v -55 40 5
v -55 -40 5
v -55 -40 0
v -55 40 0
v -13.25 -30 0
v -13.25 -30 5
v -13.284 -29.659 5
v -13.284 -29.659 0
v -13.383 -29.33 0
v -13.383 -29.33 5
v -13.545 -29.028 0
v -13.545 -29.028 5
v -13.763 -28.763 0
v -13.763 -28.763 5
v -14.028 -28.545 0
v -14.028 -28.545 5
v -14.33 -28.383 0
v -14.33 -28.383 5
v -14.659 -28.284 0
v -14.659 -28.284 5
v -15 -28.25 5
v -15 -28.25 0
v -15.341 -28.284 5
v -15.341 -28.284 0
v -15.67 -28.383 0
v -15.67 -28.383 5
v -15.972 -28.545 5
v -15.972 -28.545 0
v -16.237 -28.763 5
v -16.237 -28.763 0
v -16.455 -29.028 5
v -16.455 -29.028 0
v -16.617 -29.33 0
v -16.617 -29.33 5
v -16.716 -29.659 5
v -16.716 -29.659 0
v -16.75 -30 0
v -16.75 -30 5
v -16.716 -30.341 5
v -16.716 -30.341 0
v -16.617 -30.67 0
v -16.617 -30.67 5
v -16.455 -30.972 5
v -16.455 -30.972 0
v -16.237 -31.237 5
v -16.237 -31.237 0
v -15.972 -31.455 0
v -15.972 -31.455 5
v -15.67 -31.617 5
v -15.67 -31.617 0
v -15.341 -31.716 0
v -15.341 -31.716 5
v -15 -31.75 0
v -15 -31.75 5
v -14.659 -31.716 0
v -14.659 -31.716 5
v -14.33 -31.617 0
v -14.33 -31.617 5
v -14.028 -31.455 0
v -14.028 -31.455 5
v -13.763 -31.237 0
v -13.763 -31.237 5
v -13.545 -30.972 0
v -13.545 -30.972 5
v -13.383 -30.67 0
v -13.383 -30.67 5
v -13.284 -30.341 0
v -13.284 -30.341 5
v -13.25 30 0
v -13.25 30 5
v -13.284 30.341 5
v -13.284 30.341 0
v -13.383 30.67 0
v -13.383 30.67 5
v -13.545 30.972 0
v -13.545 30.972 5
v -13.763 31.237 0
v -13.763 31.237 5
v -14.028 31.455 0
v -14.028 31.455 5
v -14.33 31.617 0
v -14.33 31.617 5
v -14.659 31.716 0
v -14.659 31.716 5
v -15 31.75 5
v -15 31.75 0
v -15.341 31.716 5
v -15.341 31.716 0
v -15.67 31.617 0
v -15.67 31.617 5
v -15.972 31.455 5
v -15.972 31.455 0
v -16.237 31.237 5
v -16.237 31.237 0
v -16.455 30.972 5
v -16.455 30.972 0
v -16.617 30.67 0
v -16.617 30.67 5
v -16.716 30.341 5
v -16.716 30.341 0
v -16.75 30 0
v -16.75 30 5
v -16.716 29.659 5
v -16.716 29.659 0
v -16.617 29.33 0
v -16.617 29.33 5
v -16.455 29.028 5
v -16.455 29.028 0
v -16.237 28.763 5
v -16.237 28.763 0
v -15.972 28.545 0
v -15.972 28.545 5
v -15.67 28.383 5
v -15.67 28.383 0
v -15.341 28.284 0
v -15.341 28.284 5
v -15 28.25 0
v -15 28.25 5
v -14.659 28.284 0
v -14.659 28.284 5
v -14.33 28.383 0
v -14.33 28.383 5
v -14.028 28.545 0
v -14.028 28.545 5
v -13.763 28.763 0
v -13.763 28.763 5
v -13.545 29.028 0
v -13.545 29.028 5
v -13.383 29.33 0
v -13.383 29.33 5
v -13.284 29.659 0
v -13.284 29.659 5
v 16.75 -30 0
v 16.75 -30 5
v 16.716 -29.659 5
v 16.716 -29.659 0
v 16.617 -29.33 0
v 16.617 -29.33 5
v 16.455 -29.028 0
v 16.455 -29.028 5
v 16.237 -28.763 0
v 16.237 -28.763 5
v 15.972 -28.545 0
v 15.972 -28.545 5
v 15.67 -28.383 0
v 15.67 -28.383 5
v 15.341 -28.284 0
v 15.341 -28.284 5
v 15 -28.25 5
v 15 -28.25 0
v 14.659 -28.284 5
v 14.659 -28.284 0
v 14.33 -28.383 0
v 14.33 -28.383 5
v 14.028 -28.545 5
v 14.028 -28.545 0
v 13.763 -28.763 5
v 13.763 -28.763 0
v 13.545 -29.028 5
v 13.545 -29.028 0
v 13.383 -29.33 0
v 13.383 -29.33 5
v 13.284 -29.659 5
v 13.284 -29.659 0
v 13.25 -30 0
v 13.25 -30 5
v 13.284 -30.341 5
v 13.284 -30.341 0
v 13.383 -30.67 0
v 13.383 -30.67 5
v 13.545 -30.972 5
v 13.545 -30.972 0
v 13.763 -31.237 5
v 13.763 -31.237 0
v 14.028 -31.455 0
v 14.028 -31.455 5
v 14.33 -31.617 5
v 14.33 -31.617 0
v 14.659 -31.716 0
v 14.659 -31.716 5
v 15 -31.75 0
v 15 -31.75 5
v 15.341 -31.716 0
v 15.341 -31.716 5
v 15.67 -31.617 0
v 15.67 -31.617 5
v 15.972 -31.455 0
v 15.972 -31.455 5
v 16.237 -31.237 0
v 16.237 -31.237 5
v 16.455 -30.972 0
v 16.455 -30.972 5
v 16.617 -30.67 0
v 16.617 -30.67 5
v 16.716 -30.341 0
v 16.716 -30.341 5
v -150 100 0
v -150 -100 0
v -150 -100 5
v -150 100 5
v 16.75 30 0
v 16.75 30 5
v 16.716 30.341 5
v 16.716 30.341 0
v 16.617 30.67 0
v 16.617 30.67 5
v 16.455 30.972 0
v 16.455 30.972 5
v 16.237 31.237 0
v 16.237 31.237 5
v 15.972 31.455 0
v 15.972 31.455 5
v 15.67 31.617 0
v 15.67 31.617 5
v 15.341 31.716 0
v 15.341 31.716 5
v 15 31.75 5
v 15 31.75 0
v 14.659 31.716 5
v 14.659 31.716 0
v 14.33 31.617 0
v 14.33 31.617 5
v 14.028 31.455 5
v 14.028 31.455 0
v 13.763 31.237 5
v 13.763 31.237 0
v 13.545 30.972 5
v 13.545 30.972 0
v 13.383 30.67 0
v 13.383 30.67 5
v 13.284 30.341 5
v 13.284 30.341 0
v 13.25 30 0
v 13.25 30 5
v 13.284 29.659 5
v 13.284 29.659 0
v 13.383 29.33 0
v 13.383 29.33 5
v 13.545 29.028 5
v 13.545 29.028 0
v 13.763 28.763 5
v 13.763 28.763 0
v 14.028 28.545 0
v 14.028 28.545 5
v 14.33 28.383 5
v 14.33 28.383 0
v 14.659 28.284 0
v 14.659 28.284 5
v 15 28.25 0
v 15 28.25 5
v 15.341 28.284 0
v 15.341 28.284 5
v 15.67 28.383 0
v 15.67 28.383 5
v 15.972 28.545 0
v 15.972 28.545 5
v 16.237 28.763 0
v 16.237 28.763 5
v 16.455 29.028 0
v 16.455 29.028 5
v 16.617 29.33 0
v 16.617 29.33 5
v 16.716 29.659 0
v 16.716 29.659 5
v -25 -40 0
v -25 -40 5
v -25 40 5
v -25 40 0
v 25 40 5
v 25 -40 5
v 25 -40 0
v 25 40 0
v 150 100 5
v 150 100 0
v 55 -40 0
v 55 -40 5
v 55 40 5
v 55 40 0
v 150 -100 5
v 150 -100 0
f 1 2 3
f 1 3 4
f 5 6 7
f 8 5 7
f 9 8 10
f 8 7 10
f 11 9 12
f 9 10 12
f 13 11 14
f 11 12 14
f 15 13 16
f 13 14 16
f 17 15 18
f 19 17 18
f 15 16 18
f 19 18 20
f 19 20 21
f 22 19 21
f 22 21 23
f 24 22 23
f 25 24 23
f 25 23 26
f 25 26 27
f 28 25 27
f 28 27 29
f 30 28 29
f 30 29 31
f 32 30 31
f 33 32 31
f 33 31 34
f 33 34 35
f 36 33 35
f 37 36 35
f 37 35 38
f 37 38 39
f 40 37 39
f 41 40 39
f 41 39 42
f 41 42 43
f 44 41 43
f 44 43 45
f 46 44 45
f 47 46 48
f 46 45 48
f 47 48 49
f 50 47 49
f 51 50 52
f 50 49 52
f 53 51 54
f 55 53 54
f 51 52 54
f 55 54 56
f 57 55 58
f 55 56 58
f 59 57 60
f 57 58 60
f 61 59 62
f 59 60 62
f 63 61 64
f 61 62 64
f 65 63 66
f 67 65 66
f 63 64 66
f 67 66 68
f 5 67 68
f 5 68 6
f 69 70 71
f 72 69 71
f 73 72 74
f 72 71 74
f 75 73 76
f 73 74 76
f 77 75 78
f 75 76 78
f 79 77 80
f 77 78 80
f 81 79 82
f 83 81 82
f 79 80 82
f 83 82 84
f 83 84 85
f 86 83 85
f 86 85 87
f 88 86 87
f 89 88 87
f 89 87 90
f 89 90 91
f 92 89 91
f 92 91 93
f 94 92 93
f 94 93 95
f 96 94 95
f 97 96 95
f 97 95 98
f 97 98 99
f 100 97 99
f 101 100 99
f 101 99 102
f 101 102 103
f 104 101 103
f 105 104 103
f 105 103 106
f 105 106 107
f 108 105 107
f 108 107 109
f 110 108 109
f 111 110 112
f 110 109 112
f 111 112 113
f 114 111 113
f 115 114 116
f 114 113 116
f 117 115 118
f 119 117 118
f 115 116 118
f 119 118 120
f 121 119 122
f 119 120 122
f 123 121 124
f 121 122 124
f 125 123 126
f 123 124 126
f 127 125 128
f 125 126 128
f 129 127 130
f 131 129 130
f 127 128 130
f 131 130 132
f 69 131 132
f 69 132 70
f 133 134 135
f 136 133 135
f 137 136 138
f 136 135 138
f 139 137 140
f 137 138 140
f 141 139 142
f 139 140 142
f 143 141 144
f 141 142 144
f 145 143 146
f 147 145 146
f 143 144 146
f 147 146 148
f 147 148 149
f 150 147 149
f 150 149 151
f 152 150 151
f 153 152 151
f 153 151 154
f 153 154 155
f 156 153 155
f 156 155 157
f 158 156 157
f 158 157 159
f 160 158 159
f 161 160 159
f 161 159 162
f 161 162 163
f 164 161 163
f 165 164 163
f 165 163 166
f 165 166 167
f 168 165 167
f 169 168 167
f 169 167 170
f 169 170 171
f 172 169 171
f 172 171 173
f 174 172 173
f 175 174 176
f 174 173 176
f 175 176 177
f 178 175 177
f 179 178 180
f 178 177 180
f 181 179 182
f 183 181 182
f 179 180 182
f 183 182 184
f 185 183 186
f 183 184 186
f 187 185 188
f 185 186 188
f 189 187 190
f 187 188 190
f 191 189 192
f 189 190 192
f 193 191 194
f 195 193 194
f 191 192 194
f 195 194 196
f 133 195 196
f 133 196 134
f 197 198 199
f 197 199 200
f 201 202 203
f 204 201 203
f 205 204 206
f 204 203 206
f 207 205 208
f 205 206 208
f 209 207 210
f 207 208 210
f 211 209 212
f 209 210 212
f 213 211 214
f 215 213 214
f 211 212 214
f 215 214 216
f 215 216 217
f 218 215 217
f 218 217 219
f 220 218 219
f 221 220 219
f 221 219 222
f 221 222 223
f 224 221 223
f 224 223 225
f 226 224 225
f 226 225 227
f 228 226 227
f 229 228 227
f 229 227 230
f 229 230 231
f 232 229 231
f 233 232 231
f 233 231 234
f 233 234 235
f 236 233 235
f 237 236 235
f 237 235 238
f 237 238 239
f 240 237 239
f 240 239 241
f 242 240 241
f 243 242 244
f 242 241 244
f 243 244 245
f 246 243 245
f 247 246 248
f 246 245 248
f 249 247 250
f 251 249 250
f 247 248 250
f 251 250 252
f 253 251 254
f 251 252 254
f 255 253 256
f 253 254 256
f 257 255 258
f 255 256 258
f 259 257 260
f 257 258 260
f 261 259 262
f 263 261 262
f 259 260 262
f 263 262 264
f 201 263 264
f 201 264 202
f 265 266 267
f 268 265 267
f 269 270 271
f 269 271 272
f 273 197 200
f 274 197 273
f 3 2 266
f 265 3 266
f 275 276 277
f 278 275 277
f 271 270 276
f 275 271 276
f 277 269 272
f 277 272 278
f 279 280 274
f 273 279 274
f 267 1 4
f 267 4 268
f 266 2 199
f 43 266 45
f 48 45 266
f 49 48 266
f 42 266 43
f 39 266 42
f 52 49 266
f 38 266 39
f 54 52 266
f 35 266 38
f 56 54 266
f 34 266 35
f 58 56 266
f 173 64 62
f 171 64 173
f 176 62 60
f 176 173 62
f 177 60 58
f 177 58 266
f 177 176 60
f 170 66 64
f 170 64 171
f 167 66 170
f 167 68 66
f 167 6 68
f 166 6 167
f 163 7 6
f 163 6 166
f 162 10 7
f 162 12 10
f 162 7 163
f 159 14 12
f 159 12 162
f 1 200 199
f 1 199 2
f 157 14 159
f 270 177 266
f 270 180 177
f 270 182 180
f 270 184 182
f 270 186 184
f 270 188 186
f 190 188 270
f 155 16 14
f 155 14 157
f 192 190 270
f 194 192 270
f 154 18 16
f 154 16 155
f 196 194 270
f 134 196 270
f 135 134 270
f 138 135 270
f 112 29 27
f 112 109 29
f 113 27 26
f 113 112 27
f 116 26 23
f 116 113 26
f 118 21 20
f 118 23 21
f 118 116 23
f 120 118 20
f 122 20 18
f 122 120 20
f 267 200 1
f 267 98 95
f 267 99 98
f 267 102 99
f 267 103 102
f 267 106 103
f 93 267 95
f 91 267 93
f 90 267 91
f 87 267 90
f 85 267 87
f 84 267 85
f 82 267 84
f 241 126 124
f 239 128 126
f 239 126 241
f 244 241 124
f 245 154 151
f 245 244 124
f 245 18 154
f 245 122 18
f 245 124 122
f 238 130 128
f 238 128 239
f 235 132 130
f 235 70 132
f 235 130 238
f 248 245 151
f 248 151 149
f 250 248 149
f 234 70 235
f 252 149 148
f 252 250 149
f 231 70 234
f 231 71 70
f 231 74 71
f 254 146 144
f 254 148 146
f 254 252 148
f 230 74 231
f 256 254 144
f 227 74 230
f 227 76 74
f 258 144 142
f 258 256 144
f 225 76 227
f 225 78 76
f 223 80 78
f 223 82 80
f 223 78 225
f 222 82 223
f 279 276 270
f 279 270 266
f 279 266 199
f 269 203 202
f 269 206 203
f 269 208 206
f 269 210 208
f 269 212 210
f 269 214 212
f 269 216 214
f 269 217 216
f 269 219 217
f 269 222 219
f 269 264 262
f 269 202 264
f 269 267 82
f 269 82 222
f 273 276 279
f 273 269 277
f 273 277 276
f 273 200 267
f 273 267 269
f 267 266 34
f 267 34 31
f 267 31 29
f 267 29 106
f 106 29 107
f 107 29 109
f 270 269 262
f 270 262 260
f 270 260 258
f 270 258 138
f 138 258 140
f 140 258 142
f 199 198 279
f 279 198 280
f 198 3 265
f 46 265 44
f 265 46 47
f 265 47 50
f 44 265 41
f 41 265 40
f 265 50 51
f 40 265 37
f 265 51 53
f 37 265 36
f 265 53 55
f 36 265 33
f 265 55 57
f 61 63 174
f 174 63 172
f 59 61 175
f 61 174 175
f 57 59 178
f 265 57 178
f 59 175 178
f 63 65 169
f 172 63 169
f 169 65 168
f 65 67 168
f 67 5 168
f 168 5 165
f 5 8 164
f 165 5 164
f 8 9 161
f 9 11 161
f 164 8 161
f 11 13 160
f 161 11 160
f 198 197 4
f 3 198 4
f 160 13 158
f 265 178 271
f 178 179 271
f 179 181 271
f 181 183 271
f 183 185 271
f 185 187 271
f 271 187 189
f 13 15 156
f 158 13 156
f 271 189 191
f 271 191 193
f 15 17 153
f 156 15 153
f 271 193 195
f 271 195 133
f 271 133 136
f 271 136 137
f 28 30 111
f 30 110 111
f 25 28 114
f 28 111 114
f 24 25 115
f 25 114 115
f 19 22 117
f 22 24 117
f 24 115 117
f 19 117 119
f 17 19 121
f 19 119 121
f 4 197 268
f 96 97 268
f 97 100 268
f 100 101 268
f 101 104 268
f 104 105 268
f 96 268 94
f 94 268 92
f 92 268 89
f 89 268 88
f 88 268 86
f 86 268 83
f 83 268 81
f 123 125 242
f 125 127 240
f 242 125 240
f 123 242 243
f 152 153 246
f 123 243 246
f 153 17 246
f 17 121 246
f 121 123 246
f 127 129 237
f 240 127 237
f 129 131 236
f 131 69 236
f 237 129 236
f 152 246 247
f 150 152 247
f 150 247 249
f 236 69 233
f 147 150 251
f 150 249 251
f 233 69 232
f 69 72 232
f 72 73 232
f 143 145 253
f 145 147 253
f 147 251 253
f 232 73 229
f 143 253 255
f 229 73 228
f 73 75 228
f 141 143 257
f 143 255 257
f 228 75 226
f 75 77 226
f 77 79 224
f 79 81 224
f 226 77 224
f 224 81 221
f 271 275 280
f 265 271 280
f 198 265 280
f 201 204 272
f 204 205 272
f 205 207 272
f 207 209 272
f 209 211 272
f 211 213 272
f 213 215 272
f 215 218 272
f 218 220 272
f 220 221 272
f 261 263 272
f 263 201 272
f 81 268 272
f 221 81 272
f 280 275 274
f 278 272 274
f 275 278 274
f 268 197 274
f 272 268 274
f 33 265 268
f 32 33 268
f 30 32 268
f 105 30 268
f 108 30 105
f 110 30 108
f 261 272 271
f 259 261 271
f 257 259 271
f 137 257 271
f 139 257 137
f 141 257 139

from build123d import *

# Parameters (mm, degrees)
SKETCH_1_W          = 300
SKETCH_1_H          = 200
EXTRUDE_1_DEPTH     = 5
SKETCH_2_R          = 1.75
SKETCH_2_W          = 30
SKETCH_2_H          = 80
CUT_EXTRUDE_1_DEPTH = 6


with BuildPart() as part:
    # ｽｹｯﾁ1 → ﾎﾞｽ - 押し出し1 (new body)
    with BuildSketch(Plane.XY):
        Rectangle(SKETCH_1_W, SKETCH_1_H)
    extrude(amount=EXTRUDE_1_DEPTH)

    # ｽｹｯﾁ2 → ｶｯﾄ - 押し出し1 (cut, through all)
    with BuildSketch(Plane.XY.offset(5)):
        with Locations((15, 30)):
            Circle(SKETCH_2_R)
        with Locations((-15, 30)):
            Circle(SKETCH_2_R)
        with Locations((-15, -30)):
            Circle(SKETCH_2_R)
        with Locations((15, -30)):
            Circle(SKETCH_2_R)
        with Locations((40, 0)):
            Rectangle(SKETCH_2_W, SKETCH_2_H)
        with Locations((-40, 0)):
            Rectangle(SKETCH_2_W, SKETCH_2_H)
    extrude(amount=-CUT_EXTRUDE_1_DEPTH, mode=Mode.SUBTRACT)


solid = part.part
